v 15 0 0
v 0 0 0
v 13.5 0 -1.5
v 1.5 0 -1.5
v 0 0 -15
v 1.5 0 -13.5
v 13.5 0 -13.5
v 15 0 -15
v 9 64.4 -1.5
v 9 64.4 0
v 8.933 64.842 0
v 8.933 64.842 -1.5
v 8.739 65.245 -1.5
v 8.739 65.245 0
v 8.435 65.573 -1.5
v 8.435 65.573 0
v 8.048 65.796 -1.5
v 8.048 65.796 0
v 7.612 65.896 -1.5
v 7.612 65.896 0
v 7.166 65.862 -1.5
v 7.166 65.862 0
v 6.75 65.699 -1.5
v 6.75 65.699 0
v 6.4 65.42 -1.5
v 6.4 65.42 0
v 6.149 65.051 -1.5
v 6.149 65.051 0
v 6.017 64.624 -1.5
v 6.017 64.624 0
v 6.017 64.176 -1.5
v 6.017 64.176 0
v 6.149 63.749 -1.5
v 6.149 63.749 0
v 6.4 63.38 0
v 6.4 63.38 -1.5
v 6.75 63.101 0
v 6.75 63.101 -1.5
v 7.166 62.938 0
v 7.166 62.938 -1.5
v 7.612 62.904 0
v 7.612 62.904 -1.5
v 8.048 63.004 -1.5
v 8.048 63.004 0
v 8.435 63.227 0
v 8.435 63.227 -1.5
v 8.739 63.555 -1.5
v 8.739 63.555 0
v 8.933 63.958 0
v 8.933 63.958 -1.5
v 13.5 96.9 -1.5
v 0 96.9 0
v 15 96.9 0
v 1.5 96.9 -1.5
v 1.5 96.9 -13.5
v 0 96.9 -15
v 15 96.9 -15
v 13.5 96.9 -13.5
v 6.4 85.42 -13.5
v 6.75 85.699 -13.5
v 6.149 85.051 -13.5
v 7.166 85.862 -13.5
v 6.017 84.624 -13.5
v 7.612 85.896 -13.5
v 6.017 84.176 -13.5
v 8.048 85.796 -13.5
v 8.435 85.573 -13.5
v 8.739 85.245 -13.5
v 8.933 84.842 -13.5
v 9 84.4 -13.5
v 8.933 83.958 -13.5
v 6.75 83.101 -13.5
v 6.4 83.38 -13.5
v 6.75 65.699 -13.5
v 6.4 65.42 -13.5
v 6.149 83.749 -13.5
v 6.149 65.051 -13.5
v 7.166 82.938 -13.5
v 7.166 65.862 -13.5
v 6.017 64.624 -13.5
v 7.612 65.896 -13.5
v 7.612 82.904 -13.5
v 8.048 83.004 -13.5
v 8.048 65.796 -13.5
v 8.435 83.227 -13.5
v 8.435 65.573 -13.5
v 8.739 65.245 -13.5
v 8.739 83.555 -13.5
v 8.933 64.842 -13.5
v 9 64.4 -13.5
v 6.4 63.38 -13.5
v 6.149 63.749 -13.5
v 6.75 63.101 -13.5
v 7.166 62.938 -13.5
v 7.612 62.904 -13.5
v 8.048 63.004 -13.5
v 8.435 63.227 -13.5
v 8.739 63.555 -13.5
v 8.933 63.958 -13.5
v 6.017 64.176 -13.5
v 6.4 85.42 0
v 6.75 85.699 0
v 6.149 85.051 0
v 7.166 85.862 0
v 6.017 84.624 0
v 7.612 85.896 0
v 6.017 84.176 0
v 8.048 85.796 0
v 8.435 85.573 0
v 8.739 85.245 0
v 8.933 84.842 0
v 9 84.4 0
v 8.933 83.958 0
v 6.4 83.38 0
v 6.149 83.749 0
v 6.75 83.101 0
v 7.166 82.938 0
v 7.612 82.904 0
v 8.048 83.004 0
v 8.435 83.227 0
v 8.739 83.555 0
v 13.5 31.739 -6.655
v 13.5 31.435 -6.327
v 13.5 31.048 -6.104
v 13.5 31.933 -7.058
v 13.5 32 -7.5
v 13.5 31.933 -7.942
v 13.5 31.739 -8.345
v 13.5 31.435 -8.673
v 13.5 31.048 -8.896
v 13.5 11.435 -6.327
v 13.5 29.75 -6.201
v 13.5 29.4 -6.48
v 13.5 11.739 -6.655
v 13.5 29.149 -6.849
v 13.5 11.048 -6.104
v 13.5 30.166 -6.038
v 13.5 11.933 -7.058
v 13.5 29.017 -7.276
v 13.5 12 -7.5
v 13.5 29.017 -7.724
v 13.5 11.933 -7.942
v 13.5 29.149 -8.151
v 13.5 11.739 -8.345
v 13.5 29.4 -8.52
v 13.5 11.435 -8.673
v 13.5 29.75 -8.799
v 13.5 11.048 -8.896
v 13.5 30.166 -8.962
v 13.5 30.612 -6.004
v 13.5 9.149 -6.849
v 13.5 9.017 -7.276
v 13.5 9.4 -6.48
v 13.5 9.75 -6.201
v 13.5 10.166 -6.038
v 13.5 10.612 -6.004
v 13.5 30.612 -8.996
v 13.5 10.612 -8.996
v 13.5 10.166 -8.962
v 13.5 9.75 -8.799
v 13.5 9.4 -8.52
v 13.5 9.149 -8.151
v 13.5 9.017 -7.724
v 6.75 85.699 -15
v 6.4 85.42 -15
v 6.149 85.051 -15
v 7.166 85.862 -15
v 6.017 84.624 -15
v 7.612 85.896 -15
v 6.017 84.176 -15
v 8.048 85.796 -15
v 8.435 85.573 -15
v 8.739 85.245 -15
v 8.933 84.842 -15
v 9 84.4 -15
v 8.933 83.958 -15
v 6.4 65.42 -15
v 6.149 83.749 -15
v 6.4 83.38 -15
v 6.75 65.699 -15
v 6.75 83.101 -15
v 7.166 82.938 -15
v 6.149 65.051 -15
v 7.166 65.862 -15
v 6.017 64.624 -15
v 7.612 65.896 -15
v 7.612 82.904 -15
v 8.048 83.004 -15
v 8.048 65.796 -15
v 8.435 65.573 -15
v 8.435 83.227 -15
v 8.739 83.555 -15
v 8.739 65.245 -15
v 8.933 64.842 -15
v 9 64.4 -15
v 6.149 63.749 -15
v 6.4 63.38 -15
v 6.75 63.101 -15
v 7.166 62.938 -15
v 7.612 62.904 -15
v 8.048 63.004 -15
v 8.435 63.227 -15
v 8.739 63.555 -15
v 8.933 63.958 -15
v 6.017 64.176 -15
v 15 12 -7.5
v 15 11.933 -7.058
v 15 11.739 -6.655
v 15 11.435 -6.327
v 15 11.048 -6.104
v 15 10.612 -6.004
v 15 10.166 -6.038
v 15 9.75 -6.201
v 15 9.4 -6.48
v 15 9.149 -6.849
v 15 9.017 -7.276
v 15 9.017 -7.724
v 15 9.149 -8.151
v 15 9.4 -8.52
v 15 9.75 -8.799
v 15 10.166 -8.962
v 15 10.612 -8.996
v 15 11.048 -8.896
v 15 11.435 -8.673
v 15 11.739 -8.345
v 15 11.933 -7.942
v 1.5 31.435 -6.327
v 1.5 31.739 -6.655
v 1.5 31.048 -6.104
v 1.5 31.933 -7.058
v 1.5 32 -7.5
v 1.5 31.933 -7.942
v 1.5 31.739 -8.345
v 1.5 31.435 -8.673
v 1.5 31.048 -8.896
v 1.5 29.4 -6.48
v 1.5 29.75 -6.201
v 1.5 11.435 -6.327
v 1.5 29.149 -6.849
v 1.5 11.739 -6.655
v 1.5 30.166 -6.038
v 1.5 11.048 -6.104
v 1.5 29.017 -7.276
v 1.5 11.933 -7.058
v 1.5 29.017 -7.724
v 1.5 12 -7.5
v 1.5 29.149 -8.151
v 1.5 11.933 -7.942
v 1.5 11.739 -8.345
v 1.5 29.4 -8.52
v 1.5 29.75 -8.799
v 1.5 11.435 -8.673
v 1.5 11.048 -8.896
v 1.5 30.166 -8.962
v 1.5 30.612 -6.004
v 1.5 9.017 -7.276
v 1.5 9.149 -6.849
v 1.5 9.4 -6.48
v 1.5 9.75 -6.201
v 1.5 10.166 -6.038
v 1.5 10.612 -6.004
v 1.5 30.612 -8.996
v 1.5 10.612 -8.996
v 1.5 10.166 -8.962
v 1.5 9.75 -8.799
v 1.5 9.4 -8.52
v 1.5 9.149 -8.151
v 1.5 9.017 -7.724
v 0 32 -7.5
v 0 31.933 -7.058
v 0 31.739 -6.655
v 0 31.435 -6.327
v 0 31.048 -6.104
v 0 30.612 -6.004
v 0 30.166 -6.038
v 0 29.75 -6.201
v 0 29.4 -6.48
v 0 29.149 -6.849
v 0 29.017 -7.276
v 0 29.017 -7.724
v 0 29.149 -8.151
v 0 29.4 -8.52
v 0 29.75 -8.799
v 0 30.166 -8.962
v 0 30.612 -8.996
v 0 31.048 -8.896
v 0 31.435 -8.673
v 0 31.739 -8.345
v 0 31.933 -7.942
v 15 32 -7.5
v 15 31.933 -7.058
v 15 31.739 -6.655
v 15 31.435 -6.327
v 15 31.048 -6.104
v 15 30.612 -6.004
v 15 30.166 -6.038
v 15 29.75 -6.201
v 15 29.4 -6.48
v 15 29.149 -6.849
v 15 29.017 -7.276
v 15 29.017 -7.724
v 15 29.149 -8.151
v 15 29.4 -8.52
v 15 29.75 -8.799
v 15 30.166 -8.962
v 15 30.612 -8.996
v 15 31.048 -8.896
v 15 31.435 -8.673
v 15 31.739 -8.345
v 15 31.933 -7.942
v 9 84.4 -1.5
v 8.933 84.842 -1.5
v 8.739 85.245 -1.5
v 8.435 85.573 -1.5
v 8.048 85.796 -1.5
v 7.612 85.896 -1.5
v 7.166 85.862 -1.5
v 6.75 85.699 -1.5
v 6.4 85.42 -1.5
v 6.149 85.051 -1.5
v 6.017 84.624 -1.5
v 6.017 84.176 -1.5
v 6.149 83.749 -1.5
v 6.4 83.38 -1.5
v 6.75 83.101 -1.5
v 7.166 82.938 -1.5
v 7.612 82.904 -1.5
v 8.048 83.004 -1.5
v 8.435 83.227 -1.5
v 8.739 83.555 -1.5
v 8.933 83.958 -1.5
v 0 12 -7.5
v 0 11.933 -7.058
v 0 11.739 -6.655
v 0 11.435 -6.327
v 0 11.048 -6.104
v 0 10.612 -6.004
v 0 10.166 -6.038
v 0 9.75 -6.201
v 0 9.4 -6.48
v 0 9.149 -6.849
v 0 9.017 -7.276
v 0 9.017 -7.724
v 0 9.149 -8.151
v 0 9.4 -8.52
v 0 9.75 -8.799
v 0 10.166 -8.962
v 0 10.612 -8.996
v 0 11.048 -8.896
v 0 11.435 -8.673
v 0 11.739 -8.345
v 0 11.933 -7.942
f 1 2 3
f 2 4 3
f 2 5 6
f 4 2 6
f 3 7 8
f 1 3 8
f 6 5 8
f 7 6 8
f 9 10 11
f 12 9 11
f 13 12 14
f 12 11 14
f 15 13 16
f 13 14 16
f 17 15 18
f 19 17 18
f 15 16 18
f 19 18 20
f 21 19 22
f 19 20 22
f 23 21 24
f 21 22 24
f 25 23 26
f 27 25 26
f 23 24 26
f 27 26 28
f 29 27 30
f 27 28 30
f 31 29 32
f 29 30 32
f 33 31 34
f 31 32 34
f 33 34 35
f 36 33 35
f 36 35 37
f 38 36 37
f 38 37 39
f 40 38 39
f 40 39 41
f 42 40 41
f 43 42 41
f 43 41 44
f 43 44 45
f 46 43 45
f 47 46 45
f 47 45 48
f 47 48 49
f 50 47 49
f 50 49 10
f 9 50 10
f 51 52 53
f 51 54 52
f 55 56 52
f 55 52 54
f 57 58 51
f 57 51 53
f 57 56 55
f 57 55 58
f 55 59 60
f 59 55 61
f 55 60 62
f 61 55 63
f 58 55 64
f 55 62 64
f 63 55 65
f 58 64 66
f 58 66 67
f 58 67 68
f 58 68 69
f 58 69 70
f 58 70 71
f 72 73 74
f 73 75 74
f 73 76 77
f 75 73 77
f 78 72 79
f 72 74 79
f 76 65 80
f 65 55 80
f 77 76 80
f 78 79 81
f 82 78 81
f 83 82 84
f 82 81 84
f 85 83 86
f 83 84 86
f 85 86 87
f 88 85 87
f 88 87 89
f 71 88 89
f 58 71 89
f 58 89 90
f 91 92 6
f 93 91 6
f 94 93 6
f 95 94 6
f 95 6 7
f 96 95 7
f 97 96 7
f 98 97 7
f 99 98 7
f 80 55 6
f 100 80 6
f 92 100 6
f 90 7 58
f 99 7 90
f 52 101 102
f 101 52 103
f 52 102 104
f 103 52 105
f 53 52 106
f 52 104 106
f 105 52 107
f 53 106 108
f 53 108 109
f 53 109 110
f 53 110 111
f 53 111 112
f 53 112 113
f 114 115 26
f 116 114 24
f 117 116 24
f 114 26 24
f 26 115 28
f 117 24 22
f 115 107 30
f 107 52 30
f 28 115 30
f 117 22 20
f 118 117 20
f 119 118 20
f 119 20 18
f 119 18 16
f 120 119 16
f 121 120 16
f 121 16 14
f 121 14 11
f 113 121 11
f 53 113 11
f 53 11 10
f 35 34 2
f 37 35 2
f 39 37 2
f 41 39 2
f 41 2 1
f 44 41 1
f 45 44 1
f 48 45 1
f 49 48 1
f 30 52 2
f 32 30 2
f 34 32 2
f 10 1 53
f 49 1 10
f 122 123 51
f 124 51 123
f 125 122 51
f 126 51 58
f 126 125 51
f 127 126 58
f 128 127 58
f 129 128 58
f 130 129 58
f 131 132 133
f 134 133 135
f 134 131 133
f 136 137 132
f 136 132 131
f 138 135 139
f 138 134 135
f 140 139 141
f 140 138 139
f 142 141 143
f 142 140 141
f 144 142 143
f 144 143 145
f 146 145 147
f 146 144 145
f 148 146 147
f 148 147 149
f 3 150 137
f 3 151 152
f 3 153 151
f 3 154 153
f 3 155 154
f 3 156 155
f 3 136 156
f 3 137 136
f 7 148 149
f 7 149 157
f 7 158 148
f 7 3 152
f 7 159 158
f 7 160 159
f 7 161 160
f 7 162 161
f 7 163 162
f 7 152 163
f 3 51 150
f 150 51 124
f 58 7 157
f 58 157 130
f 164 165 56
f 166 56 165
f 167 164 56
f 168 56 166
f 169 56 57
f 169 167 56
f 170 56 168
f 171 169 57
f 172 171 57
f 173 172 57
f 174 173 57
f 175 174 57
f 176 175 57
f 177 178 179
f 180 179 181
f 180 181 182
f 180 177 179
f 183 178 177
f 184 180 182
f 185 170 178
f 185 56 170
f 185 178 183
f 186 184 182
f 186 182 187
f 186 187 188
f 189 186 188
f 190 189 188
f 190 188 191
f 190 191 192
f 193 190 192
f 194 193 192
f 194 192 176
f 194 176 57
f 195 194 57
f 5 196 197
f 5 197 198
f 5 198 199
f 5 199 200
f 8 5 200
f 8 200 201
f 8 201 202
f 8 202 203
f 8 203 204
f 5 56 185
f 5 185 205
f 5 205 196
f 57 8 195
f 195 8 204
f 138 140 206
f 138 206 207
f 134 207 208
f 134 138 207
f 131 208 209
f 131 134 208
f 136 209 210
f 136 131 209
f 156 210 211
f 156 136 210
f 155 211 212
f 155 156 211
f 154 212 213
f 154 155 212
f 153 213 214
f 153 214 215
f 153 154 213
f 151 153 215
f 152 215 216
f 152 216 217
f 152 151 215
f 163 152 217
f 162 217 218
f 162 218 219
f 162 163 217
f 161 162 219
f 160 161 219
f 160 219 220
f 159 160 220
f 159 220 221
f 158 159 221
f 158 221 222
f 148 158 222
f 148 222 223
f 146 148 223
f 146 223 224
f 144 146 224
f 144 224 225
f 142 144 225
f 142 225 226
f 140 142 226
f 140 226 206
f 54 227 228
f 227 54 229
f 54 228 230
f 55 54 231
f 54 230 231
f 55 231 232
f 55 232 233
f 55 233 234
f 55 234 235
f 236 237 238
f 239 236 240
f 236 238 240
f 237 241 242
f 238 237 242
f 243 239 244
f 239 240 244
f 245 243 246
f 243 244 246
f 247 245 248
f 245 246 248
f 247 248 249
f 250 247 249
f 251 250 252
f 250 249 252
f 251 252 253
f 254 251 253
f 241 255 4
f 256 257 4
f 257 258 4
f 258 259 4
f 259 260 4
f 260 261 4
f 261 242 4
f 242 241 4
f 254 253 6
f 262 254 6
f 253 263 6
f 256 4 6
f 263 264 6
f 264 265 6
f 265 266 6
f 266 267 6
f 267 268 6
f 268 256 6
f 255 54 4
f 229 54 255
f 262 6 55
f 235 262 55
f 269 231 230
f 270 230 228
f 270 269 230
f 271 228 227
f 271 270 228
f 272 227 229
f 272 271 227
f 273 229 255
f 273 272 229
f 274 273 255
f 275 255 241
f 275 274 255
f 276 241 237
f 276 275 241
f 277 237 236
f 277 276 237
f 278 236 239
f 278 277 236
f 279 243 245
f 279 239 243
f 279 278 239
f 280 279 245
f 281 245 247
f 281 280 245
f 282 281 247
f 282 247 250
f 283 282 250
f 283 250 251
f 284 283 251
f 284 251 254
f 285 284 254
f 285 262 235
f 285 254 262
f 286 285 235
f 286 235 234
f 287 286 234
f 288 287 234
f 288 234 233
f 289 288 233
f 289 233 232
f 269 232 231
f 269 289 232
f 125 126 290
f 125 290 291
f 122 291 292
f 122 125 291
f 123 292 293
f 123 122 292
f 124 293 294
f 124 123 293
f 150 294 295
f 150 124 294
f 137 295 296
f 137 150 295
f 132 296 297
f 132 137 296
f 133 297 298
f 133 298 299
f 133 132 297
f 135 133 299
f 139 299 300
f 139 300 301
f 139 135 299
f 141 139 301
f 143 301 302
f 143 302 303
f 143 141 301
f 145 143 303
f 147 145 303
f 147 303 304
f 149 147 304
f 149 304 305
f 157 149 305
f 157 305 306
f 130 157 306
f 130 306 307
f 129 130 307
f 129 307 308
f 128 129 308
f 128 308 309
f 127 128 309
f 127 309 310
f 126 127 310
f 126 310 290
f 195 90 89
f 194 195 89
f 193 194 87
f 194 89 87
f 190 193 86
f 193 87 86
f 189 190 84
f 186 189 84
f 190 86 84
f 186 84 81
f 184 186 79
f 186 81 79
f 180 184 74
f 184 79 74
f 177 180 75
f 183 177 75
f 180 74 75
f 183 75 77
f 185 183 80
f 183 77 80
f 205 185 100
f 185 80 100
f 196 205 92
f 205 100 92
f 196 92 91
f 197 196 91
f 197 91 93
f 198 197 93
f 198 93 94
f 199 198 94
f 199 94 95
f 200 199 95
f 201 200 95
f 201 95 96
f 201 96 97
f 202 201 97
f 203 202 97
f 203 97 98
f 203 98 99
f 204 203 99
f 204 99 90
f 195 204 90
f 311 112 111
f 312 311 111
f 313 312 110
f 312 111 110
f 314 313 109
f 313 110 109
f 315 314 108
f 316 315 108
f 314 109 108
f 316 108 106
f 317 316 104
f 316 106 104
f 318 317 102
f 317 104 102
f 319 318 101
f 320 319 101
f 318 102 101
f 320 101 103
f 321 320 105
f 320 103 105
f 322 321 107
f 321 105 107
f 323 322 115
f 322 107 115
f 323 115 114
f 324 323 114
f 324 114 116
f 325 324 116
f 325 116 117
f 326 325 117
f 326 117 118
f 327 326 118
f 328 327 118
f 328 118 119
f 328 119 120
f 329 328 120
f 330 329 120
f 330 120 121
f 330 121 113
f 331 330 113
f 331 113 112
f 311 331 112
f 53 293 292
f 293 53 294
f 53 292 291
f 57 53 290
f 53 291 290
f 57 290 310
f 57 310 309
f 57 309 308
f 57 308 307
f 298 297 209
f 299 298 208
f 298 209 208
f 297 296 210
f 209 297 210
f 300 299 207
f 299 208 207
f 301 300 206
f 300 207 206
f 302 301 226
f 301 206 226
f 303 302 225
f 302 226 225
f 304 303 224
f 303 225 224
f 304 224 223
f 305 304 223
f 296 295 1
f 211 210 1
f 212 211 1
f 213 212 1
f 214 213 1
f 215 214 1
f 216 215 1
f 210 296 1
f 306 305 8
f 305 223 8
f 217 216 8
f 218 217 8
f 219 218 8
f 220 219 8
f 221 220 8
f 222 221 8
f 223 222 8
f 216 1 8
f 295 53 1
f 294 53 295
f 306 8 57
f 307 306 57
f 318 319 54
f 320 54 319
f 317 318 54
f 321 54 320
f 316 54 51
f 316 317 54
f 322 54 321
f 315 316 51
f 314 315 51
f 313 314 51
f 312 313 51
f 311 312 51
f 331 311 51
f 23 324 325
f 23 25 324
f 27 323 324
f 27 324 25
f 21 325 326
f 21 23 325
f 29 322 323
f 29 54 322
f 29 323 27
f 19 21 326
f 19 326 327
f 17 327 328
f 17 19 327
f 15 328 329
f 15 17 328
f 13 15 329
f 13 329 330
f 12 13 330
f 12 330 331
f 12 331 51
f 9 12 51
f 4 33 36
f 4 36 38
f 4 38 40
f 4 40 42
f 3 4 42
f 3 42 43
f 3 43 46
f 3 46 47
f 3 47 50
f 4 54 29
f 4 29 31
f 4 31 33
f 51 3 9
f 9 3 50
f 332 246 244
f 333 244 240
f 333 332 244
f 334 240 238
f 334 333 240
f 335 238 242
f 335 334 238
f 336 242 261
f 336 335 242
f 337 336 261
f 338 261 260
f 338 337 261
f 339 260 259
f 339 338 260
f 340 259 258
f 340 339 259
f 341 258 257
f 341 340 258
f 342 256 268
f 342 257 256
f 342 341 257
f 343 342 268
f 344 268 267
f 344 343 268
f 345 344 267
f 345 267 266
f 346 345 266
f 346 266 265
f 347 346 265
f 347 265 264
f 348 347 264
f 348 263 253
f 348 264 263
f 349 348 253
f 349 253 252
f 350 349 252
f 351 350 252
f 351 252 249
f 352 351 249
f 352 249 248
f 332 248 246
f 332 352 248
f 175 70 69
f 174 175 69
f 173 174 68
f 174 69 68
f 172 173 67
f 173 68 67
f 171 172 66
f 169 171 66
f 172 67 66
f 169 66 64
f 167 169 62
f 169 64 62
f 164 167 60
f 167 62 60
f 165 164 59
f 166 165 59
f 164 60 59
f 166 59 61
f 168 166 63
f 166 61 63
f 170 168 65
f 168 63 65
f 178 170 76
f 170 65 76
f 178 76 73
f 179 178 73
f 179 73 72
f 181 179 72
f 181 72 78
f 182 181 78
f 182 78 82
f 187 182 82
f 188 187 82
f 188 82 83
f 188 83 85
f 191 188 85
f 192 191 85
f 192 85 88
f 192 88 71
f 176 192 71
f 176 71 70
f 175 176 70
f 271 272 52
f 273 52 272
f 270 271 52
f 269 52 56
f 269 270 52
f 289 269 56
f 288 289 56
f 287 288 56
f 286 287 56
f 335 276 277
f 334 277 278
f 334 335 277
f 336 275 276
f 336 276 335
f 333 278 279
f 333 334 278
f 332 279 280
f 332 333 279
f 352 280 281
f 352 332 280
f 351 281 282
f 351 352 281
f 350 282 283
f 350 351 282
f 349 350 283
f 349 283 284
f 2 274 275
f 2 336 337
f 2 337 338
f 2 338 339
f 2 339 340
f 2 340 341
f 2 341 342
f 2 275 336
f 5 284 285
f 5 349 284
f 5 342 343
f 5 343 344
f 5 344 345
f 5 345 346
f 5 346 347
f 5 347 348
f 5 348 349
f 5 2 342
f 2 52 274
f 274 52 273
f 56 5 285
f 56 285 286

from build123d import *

# Parameters (mm, degrees)
SKETCH_1_W              = 15
SKETCH_1_H              = 15
SKETCH_1_W_2            = 12
SKETCH_1_H_2            = 12
EXTRUDE_1_DEPTH         = 96.9
SKETCH_2_R              = 1.5
CUT_EXTRUDE_1_DEPTH     = 100.194808332
CUT_EXTRUDE_2_OUTLINE_R = 1.5
CUT_EXTRUDE_2_DEPTH     = 15


# Read off the part's stored shape, not the designer's step: 切除-拉伸2
with BuildPart() as part:
    # 草图1 → 凸台-拉伸1 (new body)
    with BuildSketch(Plane(origin=(0, 0, 0), x_dir=(1, 0, 0), z_dir=(0, 1, 0))):
        with Locations((7.5, 7.5)):
            Rectangle(SKETCH_1_W, SKETCH_1_H)
        with Locations((7.5, 7.5)):
            Rectangle(SKETCH_1_W_2, SKETCH_1_H_2, mode=Mode.SUBTRACT)
    extrude(amount=EXTRUDE_1_DEPTH)

    # 草图2 (on Front Plane) → 切除-拉伸1 (cut, through all)
    with BuildSketch(Plane.XY):
        with Locations((7.5, 64.4)):
            Circle(SKETCH_2_R)
        with Locations((7.5, 84.4)):
            Circle(SKETCH_2_R)
    extrude(amount=-CUT_EXTRUDE_1_DEPTH, mode=Mode.SUBTRACT)

    # 切除-拉伸2 outline → 切除-拉伸2 (cut)
    with BuildSketch(Plane.YZ):
        with Locations((10.5, -7.5)):
            Circle(CUT_EXTRUDE_2_OUTLINE_R)
        with Locations((30.5, -7.5)):
            Circle(CUT_EXTRUDE_2_OUTLINE_R)
    extrude(amount=CUT_EXTRUDE_2_DEPTH, mode=Mode.SUBTRACT)


solid = part.part
